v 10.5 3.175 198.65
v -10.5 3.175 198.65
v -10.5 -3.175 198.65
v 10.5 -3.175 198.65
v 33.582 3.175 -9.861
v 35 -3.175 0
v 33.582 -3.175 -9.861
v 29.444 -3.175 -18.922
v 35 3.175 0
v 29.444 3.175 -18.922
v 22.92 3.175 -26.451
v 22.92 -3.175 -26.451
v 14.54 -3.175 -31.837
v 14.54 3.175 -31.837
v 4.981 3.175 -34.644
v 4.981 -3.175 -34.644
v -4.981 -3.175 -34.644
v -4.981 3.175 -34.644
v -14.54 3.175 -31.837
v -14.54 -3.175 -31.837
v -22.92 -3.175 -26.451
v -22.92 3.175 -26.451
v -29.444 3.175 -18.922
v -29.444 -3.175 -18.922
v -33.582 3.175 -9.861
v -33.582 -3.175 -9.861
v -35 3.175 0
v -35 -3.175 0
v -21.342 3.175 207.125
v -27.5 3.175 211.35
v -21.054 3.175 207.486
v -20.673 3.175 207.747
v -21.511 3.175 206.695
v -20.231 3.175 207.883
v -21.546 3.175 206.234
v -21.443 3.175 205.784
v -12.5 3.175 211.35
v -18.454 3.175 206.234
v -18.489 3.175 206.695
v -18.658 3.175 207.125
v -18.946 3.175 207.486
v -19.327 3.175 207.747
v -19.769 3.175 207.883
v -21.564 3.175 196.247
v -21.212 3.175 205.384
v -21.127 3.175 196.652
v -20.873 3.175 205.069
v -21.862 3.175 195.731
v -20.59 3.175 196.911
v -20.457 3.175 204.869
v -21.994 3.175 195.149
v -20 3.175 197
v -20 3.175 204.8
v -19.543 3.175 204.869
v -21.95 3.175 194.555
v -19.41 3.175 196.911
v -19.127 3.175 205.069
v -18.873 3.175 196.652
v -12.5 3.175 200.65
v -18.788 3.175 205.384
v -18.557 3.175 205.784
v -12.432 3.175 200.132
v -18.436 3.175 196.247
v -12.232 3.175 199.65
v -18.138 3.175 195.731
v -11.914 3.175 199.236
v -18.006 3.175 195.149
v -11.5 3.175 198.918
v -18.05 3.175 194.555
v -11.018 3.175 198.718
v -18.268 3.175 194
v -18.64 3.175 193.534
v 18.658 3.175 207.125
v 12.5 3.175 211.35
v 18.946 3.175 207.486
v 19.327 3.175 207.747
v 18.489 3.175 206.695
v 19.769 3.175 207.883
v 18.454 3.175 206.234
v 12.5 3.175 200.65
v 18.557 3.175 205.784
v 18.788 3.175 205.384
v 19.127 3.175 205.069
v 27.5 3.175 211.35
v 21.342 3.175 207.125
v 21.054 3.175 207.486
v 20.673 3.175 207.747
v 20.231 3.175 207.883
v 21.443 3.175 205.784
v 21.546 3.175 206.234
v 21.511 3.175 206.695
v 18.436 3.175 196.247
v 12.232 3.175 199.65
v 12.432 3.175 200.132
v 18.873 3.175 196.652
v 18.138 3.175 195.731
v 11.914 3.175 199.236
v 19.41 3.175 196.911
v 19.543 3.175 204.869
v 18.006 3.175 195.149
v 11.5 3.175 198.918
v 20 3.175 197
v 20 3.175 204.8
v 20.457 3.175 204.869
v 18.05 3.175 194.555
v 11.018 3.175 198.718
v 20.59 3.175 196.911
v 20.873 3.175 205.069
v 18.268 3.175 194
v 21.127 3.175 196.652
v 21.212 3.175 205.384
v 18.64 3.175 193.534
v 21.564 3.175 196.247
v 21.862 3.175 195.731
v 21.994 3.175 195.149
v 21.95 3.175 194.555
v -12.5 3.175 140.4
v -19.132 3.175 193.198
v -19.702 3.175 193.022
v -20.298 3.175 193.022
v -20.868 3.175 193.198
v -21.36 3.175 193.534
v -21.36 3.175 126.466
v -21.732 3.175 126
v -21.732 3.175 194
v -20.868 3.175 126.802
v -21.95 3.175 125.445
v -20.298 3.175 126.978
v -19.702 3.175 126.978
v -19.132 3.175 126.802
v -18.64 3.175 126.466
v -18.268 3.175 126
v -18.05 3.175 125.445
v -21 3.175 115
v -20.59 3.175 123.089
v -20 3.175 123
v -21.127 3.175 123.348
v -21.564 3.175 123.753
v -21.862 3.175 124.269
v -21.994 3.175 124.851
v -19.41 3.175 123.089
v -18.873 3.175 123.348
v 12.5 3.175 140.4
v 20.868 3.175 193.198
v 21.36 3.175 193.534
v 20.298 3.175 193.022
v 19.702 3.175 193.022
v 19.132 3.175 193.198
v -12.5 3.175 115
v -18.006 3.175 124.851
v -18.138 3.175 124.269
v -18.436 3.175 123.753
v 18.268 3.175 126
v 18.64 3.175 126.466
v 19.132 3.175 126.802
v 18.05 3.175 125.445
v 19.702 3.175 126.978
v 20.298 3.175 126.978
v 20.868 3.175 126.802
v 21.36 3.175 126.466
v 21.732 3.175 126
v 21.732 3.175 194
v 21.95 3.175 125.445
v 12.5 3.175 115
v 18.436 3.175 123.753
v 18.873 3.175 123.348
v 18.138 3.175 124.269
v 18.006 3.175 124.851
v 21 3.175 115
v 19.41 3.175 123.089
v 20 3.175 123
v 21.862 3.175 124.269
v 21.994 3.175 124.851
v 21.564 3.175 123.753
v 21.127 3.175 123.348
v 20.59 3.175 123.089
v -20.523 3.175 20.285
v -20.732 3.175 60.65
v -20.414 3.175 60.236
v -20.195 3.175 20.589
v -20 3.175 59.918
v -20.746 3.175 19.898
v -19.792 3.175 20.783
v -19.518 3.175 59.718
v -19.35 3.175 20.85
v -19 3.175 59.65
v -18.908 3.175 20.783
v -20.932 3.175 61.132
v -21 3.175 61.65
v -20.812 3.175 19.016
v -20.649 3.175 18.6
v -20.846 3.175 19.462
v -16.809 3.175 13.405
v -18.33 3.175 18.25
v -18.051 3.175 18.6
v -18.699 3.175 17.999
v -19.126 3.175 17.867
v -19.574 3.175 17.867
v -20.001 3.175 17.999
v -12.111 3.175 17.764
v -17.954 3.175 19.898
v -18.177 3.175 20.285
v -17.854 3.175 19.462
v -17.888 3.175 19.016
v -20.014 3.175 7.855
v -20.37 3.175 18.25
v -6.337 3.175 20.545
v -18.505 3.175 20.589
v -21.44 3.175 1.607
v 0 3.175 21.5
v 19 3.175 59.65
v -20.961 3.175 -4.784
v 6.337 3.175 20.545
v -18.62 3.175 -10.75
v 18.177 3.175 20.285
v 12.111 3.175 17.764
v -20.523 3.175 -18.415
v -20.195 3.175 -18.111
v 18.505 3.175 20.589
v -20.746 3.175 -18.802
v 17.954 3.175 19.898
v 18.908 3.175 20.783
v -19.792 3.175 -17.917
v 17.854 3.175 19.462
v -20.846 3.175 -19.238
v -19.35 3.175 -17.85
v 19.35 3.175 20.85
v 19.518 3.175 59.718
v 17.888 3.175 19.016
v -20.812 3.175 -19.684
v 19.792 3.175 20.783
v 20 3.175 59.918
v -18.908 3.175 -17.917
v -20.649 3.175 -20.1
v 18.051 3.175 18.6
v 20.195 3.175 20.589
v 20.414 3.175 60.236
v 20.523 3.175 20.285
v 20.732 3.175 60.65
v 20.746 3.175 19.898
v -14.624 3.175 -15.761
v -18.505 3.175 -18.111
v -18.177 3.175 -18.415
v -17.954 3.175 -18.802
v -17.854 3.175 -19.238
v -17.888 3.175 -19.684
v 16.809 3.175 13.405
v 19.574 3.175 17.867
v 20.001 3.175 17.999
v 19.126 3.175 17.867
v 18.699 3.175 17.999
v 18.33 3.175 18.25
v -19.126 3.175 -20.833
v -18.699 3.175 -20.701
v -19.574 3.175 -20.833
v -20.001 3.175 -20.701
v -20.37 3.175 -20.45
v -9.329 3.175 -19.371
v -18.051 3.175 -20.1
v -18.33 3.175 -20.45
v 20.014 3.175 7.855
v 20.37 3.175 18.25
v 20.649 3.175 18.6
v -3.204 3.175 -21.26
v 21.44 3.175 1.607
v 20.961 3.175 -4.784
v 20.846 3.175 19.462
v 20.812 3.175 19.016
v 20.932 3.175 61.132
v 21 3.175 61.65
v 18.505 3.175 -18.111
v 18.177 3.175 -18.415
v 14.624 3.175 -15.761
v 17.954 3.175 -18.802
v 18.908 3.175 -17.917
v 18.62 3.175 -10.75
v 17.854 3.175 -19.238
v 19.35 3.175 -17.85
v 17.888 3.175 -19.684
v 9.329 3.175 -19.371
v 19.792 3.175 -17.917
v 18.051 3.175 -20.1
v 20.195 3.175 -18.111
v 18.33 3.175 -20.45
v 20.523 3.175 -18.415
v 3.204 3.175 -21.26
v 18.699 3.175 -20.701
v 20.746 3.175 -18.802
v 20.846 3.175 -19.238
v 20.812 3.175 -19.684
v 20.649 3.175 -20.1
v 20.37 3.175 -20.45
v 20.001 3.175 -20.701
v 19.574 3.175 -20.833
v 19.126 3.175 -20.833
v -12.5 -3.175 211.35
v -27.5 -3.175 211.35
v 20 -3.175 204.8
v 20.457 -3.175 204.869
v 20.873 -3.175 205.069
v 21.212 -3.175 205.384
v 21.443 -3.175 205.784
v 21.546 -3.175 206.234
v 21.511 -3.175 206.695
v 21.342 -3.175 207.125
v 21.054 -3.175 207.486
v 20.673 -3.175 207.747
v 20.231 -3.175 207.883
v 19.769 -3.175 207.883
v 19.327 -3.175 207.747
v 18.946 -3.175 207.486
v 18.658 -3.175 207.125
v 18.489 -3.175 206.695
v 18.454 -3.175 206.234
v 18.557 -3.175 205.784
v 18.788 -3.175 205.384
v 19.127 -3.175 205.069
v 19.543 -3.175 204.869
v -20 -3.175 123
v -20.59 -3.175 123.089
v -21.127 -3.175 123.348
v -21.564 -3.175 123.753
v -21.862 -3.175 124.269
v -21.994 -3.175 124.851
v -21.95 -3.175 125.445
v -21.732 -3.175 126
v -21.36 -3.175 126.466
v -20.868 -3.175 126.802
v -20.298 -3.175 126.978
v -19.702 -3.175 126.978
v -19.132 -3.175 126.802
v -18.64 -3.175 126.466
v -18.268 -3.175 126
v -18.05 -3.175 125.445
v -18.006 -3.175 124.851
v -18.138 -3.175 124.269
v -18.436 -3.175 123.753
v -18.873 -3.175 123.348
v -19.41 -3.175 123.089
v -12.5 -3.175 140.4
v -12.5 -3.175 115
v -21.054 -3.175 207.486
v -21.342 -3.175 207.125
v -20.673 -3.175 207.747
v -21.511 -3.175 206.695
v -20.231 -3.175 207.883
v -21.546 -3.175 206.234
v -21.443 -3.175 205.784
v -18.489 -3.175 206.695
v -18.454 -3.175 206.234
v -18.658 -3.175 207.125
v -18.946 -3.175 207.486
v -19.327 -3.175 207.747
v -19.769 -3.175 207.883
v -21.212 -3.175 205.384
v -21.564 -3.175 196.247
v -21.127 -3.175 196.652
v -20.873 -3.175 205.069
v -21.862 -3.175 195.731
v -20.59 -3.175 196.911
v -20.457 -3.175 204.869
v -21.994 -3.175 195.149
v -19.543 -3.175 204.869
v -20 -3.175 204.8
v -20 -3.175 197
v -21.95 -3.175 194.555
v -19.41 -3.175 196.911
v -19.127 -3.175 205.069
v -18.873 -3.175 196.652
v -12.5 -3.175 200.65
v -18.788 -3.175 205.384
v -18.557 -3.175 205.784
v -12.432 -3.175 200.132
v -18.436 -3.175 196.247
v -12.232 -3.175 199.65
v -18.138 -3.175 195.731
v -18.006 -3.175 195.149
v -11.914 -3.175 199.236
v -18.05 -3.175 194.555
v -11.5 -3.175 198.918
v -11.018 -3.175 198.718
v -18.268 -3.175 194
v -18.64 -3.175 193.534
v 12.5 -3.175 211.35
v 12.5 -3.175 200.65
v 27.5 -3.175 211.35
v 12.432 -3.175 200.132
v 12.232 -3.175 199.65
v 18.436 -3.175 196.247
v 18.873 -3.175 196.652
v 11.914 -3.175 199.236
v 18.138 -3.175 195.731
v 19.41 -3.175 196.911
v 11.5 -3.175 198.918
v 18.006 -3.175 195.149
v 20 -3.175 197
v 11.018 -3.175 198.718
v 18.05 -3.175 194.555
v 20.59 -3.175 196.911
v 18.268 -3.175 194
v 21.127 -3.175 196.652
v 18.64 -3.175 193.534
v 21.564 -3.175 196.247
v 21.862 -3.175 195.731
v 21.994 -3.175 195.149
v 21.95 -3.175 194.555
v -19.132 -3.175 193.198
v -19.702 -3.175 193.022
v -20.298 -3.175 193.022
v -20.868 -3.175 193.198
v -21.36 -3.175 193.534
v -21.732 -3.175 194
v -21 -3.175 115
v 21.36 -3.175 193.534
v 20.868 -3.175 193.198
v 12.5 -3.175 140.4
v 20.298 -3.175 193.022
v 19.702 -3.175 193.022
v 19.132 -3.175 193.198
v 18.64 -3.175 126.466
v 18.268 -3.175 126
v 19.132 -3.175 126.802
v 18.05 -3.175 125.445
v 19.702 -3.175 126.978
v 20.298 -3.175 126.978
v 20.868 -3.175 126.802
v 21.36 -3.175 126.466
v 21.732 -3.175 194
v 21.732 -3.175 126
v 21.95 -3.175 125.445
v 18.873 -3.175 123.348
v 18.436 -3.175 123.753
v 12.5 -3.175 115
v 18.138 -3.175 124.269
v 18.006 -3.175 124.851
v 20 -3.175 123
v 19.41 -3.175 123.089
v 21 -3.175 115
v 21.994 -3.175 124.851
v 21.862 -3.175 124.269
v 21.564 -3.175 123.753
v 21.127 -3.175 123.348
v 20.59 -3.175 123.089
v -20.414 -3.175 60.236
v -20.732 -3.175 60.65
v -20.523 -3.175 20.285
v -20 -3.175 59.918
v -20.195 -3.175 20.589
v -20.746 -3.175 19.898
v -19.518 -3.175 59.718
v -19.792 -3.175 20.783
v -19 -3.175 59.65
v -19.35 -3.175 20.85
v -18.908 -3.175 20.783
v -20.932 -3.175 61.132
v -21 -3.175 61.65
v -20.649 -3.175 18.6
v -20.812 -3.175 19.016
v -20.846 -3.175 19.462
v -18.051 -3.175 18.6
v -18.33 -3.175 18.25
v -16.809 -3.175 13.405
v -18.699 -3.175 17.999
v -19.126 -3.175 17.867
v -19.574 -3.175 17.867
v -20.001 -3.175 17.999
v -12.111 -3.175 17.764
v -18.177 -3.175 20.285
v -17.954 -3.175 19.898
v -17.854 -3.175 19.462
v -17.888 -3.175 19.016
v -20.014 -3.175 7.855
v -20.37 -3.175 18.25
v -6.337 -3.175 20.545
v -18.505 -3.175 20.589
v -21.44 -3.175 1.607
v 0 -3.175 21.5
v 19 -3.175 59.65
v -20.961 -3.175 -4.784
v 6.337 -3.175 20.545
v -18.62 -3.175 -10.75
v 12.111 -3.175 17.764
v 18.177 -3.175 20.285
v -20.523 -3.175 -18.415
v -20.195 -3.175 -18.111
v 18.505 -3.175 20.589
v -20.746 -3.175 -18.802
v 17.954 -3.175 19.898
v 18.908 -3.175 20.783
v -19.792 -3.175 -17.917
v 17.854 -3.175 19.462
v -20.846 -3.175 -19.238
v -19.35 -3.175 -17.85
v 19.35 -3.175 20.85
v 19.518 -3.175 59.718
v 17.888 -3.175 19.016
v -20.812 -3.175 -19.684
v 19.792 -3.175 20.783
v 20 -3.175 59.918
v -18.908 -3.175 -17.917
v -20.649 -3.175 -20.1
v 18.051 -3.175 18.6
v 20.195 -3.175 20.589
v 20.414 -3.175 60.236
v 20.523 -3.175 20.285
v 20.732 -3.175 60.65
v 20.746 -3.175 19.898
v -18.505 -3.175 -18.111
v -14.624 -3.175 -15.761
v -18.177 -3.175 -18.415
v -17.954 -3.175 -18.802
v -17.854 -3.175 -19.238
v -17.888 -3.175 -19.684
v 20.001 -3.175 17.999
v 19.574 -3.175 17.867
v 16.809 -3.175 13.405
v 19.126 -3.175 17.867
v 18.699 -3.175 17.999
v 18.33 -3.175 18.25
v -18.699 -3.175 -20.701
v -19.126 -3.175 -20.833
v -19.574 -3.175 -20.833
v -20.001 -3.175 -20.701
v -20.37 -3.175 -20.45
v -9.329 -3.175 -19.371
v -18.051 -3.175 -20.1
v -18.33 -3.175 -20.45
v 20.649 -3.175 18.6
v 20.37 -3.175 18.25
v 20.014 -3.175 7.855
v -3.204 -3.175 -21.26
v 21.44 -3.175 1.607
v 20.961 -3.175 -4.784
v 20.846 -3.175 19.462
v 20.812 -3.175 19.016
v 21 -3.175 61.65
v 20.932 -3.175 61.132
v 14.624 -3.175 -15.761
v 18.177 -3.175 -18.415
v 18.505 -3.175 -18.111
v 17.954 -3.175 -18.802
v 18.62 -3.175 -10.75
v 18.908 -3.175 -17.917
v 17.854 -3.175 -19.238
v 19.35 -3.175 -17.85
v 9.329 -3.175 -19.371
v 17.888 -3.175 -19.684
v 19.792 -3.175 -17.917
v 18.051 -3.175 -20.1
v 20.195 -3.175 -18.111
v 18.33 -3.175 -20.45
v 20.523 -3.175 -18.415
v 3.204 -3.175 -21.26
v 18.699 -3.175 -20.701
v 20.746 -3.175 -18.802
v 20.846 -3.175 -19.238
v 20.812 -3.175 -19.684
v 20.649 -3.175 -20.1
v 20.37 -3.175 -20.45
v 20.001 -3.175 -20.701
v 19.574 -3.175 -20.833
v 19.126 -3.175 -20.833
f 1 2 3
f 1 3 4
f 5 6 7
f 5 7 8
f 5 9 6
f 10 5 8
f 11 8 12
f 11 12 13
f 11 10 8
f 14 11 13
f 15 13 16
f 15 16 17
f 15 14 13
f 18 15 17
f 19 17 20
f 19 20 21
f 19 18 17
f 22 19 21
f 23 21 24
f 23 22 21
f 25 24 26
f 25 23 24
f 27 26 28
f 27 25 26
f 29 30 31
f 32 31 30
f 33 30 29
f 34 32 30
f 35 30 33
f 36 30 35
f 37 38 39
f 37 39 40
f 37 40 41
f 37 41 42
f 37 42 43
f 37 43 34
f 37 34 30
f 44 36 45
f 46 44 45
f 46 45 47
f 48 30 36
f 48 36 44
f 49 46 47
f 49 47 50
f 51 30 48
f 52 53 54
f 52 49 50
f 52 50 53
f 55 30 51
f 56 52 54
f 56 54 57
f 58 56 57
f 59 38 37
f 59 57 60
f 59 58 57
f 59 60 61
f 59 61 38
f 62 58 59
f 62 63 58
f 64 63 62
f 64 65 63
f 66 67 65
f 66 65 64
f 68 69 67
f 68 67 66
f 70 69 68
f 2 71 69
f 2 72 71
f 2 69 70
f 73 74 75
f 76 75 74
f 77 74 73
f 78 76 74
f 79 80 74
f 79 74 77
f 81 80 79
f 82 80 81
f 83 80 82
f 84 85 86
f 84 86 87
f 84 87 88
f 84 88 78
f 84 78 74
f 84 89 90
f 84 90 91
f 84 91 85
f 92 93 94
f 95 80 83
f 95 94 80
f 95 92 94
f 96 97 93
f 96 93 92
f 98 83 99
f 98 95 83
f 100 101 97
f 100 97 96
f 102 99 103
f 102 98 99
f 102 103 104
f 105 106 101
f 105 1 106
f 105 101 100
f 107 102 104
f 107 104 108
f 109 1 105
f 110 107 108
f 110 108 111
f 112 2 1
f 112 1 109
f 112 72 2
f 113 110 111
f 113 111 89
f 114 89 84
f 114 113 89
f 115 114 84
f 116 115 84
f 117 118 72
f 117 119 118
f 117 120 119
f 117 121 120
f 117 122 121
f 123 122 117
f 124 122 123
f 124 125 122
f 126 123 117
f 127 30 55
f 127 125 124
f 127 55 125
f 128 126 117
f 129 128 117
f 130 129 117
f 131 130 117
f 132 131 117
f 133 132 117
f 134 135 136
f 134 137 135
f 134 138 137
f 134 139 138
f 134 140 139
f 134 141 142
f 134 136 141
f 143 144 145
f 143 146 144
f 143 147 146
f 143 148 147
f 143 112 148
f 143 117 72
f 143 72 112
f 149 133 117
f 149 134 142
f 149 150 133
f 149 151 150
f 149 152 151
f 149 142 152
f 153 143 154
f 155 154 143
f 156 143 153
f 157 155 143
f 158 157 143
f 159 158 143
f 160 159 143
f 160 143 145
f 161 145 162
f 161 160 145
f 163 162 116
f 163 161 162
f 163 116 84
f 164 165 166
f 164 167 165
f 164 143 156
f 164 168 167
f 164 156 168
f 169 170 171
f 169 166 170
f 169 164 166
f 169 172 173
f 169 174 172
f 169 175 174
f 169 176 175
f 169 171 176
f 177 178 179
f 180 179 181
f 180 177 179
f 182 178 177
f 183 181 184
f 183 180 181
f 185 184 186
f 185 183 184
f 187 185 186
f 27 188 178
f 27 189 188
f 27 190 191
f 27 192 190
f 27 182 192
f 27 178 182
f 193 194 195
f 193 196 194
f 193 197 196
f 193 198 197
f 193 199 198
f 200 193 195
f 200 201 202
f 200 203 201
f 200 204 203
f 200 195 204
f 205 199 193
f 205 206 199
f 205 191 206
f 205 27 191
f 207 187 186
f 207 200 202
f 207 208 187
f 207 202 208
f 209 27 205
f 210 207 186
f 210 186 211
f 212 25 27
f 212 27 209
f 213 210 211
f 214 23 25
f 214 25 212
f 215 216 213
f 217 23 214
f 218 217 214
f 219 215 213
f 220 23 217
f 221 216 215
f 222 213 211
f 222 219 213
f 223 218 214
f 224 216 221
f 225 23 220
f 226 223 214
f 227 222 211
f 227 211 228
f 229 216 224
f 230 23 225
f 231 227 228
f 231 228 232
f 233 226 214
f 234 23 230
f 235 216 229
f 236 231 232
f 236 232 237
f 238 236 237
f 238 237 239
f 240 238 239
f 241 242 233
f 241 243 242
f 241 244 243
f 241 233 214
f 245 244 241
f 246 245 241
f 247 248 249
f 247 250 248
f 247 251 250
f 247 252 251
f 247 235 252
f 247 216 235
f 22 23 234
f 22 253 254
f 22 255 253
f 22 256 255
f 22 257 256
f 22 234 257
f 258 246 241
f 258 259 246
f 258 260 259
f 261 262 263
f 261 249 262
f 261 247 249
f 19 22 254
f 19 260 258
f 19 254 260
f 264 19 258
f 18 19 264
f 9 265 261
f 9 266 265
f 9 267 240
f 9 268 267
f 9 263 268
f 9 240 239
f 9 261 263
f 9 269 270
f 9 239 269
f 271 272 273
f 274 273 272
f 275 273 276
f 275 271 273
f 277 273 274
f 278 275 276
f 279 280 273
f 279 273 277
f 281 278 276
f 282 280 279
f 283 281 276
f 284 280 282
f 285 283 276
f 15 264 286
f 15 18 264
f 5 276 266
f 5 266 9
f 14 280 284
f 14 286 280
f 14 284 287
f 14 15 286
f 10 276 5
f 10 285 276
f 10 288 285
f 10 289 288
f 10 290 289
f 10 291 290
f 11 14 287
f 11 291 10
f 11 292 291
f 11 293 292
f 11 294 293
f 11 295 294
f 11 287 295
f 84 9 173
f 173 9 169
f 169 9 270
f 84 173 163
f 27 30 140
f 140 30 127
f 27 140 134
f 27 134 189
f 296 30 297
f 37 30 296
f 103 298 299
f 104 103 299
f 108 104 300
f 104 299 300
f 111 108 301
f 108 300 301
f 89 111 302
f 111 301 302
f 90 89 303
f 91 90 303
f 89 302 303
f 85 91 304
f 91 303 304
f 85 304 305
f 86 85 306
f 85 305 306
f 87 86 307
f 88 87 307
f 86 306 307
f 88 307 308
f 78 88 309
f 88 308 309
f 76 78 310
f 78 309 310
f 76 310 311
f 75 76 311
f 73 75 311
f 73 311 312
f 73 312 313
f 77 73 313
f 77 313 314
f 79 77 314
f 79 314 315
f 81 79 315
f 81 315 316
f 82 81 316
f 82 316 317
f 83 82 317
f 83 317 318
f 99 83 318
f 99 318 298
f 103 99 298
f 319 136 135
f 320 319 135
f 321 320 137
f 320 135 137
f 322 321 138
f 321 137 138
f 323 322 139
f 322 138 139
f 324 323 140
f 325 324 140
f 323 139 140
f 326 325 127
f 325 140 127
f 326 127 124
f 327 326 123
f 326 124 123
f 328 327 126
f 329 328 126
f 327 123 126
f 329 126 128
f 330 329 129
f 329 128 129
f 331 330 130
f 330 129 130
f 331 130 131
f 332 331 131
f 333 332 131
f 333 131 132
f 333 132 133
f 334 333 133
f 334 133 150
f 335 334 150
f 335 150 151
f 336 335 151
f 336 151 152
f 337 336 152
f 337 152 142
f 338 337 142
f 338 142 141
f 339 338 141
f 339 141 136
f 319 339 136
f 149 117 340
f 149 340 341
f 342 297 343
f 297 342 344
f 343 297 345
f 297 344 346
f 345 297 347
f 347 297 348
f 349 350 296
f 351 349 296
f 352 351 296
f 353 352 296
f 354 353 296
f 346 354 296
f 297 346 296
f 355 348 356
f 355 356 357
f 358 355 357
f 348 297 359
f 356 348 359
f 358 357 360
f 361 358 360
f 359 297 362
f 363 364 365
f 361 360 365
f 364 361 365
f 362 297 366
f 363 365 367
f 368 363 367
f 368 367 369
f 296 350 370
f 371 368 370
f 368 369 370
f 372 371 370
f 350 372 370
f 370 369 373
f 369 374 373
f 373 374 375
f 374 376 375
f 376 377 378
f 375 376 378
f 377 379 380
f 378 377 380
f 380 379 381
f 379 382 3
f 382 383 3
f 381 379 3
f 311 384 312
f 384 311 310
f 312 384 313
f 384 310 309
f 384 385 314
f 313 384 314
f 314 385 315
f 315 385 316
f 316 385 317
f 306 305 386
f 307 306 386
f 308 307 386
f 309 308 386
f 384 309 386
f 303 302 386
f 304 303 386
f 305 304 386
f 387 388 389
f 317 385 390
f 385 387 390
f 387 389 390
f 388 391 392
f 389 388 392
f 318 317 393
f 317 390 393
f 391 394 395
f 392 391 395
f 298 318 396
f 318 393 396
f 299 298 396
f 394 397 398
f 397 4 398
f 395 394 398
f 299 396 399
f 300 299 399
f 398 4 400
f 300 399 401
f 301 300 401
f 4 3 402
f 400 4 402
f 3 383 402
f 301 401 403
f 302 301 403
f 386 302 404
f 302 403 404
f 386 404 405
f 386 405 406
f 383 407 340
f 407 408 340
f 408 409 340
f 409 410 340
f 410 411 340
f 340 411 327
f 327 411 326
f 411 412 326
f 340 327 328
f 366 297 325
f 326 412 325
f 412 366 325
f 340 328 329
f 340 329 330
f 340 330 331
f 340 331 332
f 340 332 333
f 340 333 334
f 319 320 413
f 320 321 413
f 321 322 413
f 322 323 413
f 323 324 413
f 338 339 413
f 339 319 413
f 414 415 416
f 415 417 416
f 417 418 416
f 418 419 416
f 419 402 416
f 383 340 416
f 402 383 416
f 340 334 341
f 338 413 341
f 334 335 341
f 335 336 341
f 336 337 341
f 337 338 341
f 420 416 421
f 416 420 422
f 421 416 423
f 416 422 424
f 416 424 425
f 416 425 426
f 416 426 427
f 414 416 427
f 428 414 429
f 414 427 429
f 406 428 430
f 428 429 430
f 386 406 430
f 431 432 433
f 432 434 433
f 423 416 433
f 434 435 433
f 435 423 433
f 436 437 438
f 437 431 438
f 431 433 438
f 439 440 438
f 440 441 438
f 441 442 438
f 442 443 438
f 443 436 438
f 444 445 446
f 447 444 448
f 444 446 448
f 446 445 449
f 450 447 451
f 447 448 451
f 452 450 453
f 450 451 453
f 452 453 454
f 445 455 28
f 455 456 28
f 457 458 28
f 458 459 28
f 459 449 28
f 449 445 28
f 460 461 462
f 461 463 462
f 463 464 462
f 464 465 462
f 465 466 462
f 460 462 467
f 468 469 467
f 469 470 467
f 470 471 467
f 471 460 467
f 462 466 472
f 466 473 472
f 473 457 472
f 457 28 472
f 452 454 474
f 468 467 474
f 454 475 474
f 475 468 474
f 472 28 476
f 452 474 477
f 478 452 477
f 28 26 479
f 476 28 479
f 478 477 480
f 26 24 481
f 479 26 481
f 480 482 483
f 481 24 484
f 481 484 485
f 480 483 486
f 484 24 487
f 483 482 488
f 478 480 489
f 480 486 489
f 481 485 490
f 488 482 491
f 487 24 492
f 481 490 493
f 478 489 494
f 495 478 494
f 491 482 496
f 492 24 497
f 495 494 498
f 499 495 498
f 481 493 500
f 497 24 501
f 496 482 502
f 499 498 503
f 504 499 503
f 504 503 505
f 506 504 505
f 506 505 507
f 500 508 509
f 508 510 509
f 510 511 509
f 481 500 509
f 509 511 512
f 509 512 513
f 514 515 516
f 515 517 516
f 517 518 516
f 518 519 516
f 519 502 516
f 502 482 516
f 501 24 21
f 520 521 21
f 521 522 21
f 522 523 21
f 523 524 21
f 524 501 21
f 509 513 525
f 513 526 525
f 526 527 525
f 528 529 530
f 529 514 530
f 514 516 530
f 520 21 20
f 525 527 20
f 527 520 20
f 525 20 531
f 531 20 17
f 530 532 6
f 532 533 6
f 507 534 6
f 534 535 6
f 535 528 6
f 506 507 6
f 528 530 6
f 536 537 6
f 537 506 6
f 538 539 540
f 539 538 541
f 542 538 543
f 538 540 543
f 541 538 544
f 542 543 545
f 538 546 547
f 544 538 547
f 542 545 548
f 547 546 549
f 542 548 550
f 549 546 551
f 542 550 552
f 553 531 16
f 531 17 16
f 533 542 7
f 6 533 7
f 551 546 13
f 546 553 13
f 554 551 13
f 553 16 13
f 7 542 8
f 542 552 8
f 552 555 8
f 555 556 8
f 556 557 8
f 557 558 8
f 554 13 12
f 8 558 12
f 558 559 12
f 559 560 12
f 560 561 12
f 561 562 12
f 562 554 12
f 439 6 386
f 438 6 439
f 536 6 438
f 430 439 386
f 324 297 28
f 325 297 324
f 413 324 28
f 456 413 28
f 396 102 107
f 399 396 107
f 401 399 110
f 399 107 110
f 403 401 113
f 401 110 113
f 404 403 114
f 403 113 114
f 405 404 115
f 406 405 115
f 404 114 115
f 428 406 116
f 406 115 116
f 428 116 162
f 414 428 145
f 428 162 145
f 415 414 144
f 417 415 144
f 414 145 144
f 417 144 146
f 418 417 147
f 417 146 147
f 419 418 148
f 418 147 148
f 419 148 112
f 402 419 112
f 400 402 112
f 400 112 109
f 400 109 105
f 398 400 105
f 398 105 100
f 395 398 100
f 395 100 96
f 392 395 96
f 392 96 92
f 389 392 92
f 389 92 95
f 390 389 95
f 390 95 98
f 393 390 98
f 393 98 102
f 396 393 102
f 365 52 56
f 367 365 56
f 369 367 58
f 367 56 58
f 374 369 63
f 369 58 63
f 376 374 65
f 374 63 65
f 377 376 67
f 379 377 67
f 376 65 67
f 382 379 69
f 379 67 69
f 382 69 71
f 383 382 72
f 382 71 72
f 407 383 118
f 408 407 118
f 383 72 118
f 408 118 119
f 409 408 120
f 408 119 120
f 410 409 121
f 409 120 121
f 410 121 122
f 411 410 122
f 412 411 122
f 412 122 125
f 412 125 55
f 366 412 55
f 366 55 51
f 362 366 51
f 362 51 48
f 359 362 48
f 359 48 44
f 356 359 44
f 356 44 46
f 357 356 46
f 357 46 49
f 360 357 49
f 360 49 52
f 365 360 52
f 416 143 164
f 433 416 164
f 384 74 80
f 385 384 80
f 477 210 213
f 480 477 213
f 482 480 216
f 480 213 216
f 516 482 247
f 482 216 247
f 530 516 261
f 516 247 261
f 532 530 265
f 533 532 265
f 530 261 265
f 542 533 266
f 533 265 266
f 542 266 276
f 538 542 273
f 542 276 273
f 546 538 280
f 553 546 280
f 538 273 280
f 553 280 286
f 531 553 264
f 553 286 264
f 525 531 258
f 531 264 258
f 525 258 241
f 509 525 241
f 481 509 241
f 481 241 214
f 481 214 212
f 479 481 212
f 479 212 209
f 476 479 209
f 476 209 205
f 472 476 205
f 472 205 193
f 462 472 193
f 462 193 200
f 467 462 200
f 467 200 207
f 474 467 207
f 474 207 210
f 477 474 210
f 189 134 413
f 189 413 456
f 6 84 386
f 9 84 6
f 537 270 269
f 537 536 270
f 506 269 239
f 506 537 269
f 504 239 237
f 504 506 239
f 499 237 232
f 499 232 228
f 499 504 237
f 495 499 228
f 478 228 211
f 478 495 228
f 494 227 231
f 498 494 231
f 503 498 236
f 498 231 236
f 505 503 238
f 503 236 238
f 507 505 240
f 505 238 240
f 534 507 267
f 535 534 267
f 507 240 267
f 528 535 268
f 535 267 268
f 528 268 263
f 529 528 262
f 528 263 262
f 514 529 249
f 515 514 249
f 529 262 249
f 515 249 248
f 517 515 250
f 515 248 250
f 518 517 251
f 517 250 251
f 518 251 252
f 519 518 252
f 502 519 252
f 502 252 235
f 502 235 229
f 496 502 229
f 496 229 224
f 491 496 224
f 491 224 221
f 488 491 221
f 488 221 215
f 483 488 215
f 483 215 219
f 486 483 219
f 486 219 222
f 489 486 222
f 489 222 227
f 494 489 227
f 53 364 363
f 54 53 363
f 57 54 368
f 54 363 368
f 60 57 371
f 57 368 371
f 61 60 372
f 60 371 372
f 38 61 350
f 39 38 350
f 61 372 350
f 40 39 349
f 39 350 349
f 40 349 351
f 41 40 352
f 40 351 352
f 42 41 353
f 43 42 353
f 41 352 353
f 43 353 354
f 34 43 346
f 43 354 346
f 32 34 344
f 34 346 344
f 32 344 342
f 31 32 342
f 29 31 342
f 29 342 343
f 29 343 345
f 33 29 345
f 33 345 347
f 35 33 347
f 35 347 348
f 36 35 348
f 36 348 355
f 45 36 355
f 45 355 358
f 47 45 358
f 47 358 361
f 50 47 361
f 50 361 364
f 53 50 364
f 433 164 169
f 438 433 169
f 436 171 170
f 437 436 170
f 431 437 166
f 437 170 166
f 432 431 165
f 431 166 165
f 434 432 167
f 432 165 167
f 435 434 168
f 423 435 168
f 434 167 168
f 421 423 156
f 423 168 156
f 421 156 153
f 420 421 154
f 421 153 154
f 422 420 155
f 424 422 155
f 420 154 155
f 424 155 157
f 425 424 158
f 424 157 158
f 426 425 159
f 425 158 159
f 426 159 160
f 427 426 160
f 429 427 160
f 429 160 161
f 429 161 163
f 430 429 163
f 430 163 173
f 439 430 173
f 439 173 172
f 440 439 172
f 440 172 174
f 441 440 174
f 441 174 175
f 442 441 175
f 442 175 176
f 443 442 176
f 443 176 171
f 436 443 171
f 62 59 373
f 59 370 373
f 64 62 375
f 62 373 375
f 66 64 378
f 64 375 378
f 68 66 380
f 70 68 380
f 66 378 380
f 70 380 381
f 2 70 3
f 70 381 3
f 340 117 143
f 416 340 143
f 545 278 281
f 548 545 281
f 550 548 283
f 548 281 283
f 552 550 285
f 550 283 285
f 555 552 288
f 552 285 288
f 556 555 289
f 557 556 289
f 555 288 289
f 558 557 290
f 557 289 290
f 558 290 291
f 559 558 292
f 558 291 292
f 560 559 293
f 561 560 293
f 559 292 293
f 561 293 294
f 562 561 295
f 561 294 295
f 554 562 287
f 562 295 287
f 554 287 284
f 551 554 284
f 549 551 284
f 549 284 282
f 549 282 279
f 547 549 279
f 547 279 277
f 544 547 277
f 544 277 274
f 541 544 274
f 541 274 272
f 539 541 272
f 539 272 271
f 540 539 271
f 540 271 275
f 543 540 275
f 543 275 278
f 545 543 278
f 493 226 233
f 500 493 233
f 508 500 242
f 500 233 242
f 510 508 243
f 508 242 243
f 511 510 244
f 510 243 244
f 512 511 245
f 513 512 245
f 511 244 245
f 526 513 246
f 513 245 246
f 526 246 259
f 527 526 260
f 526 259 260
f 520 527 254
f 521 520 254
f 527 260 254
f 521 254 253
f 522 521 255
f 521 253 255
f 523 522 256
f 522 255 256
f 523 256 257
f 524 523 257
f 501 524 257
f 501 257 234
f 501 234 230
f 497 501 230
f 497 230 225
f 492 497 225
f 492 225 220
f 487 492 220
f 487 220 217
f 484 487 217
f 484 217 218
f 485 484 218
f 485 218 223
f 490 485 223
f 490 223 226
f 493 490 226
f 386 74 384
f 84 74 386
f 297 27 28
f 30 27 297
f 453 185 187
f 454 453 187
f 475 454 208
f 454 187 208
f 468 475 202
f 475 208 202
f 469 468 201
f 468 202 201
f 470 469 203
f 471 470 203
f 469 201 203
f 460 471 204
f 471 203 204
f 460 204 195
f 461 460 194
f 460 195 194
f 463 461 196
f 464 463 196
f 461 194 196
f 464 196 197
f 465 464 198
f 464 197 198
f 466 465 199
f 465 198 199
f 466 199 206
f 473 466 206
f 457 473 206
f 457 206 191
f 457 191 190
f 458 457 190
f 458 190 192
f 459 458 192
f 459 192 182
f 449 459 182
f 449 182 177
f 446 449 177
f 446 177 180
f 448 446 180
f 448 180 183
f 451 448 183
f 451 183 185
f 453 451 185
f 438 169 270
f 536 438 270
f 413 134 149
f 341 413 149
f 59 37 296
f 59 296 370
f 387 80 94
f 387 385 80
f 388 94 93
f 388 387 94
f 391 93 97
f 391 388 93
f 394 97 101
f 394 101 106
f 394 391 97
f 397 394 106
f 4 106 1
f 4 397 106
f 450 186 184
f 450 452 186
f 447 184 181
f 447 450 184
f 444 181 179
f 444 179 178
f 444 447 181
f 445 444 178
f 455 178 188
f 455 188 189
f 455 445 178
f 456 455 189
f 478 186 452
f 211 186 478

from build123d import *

# Parameters (mm, degrees)
BOSS_EXTRUDE1_DEPTH = 3.175
SKETCH2_R           = 21.5
CUT_EXTRUDE1_DEPTH  = 215.322525648
SKETCH3_W           = 42
SKETCH3_H           = 55.35
SKETCH3_W_2         = 25
SKETCH3_H_2         = 96.35
CUT_EXTRUDE2_DEPTH  = 215.322525648
SKETCH4_R           = 1.5
CUT_EXTRUDE3_DEPTH  = 215.322525648
SKETCH5_R           = 2
CUT_EXTRUDE4_DEPTH  = 215.322525648
SKETCH7_R           = 1.55
CUT_EXTRUDE6_DEPTH  = 215.322525648
SKETCH8_W           = 25
SKETCH8_H           = 58.25
BOSS_EXTRUDE2_DEPTH = 6.35
FILLET1_R           = 2


with BuildPart() as part:
    # Sketch1 → Boss-Extrude1 (new, symmetric)
    with BuildSketch(Plane(origin=(0, 0, 0), x_dir=(1, 0, 0), z_dir=(0, 1, 0))):
        with BuildLine():
            ThreePointArc((35, 0), (0, 35), (-35, 0))
            Line((-35, 0), (-27.5, -211.35))
            Line((-27.5, -211.35), (27.5, -211.35))
            Line((27.5, -211.35), (35, 0))
        make_face()
    extrude(amount=BOSS_EXTRUDE1_DEPTH, both=True)

    # Sketch2 → Cut-Extrude1 (cut, through all)
    with BuildSketch(Plane(origin=(0, 3.175, 0), x_dir=(1, 0, 0), z_dir=(0, 1, 0))):
        with Locations(Location((0, 0, 0), (0, 0, 270))):
            Circle(SKETCH2_R)
    extrude(amount=-CUT_EXTRUDE1_DEPTH, mode=Mode.SUBTRACT)

    # Sketch3 → Cut-Extrude2 (cut, through all)
    with BuildSketch(Plane(origin=(0, 3.175, 0), x_dir=(1, 0, 0), z_dir=(0, 1, 0))):
        with Locations((0, -87.325)):
            Rectangle(SKETCH3_W, SKETCH3_H)
        with Locations((0, -163.175)):
            Rectangle(SKETCH3_W_2, SKETCH3_H_2)
    extrude(amount=-CUT_EXTRUDE2_DEPTH, mode=Mode.SUBTRACT)

    # Sketch4 → Cut-Extrude3 (cut, through all)
    with BuildSketch(Plane(origin=(0, 3.175, 0), x_dir=(1, 0, 0), z_dir=(0, 1, 0))):
        with Locations(Location((-19.35, 19.35, 0), (0, 0, 270))):
            Circle(SKETCH4_R)
        with Locations(Location((19.35, 19.35, 0), (0, 0, 270))):
            Circle(SKETCH4_R)
        with Locations(Location((19.35, -19.35, 0), (0, 0, 270))):
            Circle(SKETCH4_R)
        with Locations(Location((-19.35, -19.35, 0), (0, 0, 270))):
            Circle(SKETCH4_R)
    extrude(amount=-CUT_EXTRUDE3_DEPTH, mode=Mode.SUBTRACT)

    # Sketch5 → Cut-Extrude4 (cut, through all)
    with BuildSketch(Plane(origin=(0, 3.175, 0), x_dir=(1, 0, 0), z_dir=(0, 1, 0))):
        with Locations(Location((-20, -195, 0), (0, 0, 270))):
            Circle(SKETCH5_R)
        with Locations(Location((20, -195, 0), (0, 0, 270))):
            Circle(SKETCH5_R)
        with Locations(Location((20, -125, 0), (0, 0, 90))):
            Circle(SKETCH5_R)
        with Locations(Location((-20, -125, 0), (0, 0, 90))):
            Circle(SKETCH5_R)
    extrude(amount=-CUT_EXTRUDE4_DEPTH, mode=Mode.SUBTRACT)

    # Sketch7 → Cut-Extrude6 (cut, through all)
    with BuildSketch(Plane.XZ.offset(3.175)):
        with Locations(Location((-20, 206.35, 0), (0, 0, 270))):
            Circle(SKETCH7_R)
        with Locations(Location((20, 206.35, 0), (0, 0, 270))):
            Circle(SKETCH7_R)
    extrude(amount=-CUT_EXTRUDE6_DEPTH, mode=Mode.SUBTRACT)

    # Sketch8 → Boss-Extrude2 (add)
    with BuildSketch(Plane(origin=(0, 3.175, 0), x_dir=(1, 0, 0), z_dir=(0, 1, 0))):
        with Locations((0, -169.525)):
            Rectangle(SKETCH8_W, SKETCH8_H)
    extrude(amount=-BOSS_EXTRUDE2_DEPTH)

    # Fillet1
    fillet1_edges = [part.edges().sort_by_distance(p)[0] for p in [
        (-12.5, 0, 198.65),
        (12.5, 0, 198.65),
        (-21, 0, 59.65),
        (21, 0, 59.65),
    ]]
    fillet(fillet1_edges, radius=FILLET1_R)


solid = part.part
